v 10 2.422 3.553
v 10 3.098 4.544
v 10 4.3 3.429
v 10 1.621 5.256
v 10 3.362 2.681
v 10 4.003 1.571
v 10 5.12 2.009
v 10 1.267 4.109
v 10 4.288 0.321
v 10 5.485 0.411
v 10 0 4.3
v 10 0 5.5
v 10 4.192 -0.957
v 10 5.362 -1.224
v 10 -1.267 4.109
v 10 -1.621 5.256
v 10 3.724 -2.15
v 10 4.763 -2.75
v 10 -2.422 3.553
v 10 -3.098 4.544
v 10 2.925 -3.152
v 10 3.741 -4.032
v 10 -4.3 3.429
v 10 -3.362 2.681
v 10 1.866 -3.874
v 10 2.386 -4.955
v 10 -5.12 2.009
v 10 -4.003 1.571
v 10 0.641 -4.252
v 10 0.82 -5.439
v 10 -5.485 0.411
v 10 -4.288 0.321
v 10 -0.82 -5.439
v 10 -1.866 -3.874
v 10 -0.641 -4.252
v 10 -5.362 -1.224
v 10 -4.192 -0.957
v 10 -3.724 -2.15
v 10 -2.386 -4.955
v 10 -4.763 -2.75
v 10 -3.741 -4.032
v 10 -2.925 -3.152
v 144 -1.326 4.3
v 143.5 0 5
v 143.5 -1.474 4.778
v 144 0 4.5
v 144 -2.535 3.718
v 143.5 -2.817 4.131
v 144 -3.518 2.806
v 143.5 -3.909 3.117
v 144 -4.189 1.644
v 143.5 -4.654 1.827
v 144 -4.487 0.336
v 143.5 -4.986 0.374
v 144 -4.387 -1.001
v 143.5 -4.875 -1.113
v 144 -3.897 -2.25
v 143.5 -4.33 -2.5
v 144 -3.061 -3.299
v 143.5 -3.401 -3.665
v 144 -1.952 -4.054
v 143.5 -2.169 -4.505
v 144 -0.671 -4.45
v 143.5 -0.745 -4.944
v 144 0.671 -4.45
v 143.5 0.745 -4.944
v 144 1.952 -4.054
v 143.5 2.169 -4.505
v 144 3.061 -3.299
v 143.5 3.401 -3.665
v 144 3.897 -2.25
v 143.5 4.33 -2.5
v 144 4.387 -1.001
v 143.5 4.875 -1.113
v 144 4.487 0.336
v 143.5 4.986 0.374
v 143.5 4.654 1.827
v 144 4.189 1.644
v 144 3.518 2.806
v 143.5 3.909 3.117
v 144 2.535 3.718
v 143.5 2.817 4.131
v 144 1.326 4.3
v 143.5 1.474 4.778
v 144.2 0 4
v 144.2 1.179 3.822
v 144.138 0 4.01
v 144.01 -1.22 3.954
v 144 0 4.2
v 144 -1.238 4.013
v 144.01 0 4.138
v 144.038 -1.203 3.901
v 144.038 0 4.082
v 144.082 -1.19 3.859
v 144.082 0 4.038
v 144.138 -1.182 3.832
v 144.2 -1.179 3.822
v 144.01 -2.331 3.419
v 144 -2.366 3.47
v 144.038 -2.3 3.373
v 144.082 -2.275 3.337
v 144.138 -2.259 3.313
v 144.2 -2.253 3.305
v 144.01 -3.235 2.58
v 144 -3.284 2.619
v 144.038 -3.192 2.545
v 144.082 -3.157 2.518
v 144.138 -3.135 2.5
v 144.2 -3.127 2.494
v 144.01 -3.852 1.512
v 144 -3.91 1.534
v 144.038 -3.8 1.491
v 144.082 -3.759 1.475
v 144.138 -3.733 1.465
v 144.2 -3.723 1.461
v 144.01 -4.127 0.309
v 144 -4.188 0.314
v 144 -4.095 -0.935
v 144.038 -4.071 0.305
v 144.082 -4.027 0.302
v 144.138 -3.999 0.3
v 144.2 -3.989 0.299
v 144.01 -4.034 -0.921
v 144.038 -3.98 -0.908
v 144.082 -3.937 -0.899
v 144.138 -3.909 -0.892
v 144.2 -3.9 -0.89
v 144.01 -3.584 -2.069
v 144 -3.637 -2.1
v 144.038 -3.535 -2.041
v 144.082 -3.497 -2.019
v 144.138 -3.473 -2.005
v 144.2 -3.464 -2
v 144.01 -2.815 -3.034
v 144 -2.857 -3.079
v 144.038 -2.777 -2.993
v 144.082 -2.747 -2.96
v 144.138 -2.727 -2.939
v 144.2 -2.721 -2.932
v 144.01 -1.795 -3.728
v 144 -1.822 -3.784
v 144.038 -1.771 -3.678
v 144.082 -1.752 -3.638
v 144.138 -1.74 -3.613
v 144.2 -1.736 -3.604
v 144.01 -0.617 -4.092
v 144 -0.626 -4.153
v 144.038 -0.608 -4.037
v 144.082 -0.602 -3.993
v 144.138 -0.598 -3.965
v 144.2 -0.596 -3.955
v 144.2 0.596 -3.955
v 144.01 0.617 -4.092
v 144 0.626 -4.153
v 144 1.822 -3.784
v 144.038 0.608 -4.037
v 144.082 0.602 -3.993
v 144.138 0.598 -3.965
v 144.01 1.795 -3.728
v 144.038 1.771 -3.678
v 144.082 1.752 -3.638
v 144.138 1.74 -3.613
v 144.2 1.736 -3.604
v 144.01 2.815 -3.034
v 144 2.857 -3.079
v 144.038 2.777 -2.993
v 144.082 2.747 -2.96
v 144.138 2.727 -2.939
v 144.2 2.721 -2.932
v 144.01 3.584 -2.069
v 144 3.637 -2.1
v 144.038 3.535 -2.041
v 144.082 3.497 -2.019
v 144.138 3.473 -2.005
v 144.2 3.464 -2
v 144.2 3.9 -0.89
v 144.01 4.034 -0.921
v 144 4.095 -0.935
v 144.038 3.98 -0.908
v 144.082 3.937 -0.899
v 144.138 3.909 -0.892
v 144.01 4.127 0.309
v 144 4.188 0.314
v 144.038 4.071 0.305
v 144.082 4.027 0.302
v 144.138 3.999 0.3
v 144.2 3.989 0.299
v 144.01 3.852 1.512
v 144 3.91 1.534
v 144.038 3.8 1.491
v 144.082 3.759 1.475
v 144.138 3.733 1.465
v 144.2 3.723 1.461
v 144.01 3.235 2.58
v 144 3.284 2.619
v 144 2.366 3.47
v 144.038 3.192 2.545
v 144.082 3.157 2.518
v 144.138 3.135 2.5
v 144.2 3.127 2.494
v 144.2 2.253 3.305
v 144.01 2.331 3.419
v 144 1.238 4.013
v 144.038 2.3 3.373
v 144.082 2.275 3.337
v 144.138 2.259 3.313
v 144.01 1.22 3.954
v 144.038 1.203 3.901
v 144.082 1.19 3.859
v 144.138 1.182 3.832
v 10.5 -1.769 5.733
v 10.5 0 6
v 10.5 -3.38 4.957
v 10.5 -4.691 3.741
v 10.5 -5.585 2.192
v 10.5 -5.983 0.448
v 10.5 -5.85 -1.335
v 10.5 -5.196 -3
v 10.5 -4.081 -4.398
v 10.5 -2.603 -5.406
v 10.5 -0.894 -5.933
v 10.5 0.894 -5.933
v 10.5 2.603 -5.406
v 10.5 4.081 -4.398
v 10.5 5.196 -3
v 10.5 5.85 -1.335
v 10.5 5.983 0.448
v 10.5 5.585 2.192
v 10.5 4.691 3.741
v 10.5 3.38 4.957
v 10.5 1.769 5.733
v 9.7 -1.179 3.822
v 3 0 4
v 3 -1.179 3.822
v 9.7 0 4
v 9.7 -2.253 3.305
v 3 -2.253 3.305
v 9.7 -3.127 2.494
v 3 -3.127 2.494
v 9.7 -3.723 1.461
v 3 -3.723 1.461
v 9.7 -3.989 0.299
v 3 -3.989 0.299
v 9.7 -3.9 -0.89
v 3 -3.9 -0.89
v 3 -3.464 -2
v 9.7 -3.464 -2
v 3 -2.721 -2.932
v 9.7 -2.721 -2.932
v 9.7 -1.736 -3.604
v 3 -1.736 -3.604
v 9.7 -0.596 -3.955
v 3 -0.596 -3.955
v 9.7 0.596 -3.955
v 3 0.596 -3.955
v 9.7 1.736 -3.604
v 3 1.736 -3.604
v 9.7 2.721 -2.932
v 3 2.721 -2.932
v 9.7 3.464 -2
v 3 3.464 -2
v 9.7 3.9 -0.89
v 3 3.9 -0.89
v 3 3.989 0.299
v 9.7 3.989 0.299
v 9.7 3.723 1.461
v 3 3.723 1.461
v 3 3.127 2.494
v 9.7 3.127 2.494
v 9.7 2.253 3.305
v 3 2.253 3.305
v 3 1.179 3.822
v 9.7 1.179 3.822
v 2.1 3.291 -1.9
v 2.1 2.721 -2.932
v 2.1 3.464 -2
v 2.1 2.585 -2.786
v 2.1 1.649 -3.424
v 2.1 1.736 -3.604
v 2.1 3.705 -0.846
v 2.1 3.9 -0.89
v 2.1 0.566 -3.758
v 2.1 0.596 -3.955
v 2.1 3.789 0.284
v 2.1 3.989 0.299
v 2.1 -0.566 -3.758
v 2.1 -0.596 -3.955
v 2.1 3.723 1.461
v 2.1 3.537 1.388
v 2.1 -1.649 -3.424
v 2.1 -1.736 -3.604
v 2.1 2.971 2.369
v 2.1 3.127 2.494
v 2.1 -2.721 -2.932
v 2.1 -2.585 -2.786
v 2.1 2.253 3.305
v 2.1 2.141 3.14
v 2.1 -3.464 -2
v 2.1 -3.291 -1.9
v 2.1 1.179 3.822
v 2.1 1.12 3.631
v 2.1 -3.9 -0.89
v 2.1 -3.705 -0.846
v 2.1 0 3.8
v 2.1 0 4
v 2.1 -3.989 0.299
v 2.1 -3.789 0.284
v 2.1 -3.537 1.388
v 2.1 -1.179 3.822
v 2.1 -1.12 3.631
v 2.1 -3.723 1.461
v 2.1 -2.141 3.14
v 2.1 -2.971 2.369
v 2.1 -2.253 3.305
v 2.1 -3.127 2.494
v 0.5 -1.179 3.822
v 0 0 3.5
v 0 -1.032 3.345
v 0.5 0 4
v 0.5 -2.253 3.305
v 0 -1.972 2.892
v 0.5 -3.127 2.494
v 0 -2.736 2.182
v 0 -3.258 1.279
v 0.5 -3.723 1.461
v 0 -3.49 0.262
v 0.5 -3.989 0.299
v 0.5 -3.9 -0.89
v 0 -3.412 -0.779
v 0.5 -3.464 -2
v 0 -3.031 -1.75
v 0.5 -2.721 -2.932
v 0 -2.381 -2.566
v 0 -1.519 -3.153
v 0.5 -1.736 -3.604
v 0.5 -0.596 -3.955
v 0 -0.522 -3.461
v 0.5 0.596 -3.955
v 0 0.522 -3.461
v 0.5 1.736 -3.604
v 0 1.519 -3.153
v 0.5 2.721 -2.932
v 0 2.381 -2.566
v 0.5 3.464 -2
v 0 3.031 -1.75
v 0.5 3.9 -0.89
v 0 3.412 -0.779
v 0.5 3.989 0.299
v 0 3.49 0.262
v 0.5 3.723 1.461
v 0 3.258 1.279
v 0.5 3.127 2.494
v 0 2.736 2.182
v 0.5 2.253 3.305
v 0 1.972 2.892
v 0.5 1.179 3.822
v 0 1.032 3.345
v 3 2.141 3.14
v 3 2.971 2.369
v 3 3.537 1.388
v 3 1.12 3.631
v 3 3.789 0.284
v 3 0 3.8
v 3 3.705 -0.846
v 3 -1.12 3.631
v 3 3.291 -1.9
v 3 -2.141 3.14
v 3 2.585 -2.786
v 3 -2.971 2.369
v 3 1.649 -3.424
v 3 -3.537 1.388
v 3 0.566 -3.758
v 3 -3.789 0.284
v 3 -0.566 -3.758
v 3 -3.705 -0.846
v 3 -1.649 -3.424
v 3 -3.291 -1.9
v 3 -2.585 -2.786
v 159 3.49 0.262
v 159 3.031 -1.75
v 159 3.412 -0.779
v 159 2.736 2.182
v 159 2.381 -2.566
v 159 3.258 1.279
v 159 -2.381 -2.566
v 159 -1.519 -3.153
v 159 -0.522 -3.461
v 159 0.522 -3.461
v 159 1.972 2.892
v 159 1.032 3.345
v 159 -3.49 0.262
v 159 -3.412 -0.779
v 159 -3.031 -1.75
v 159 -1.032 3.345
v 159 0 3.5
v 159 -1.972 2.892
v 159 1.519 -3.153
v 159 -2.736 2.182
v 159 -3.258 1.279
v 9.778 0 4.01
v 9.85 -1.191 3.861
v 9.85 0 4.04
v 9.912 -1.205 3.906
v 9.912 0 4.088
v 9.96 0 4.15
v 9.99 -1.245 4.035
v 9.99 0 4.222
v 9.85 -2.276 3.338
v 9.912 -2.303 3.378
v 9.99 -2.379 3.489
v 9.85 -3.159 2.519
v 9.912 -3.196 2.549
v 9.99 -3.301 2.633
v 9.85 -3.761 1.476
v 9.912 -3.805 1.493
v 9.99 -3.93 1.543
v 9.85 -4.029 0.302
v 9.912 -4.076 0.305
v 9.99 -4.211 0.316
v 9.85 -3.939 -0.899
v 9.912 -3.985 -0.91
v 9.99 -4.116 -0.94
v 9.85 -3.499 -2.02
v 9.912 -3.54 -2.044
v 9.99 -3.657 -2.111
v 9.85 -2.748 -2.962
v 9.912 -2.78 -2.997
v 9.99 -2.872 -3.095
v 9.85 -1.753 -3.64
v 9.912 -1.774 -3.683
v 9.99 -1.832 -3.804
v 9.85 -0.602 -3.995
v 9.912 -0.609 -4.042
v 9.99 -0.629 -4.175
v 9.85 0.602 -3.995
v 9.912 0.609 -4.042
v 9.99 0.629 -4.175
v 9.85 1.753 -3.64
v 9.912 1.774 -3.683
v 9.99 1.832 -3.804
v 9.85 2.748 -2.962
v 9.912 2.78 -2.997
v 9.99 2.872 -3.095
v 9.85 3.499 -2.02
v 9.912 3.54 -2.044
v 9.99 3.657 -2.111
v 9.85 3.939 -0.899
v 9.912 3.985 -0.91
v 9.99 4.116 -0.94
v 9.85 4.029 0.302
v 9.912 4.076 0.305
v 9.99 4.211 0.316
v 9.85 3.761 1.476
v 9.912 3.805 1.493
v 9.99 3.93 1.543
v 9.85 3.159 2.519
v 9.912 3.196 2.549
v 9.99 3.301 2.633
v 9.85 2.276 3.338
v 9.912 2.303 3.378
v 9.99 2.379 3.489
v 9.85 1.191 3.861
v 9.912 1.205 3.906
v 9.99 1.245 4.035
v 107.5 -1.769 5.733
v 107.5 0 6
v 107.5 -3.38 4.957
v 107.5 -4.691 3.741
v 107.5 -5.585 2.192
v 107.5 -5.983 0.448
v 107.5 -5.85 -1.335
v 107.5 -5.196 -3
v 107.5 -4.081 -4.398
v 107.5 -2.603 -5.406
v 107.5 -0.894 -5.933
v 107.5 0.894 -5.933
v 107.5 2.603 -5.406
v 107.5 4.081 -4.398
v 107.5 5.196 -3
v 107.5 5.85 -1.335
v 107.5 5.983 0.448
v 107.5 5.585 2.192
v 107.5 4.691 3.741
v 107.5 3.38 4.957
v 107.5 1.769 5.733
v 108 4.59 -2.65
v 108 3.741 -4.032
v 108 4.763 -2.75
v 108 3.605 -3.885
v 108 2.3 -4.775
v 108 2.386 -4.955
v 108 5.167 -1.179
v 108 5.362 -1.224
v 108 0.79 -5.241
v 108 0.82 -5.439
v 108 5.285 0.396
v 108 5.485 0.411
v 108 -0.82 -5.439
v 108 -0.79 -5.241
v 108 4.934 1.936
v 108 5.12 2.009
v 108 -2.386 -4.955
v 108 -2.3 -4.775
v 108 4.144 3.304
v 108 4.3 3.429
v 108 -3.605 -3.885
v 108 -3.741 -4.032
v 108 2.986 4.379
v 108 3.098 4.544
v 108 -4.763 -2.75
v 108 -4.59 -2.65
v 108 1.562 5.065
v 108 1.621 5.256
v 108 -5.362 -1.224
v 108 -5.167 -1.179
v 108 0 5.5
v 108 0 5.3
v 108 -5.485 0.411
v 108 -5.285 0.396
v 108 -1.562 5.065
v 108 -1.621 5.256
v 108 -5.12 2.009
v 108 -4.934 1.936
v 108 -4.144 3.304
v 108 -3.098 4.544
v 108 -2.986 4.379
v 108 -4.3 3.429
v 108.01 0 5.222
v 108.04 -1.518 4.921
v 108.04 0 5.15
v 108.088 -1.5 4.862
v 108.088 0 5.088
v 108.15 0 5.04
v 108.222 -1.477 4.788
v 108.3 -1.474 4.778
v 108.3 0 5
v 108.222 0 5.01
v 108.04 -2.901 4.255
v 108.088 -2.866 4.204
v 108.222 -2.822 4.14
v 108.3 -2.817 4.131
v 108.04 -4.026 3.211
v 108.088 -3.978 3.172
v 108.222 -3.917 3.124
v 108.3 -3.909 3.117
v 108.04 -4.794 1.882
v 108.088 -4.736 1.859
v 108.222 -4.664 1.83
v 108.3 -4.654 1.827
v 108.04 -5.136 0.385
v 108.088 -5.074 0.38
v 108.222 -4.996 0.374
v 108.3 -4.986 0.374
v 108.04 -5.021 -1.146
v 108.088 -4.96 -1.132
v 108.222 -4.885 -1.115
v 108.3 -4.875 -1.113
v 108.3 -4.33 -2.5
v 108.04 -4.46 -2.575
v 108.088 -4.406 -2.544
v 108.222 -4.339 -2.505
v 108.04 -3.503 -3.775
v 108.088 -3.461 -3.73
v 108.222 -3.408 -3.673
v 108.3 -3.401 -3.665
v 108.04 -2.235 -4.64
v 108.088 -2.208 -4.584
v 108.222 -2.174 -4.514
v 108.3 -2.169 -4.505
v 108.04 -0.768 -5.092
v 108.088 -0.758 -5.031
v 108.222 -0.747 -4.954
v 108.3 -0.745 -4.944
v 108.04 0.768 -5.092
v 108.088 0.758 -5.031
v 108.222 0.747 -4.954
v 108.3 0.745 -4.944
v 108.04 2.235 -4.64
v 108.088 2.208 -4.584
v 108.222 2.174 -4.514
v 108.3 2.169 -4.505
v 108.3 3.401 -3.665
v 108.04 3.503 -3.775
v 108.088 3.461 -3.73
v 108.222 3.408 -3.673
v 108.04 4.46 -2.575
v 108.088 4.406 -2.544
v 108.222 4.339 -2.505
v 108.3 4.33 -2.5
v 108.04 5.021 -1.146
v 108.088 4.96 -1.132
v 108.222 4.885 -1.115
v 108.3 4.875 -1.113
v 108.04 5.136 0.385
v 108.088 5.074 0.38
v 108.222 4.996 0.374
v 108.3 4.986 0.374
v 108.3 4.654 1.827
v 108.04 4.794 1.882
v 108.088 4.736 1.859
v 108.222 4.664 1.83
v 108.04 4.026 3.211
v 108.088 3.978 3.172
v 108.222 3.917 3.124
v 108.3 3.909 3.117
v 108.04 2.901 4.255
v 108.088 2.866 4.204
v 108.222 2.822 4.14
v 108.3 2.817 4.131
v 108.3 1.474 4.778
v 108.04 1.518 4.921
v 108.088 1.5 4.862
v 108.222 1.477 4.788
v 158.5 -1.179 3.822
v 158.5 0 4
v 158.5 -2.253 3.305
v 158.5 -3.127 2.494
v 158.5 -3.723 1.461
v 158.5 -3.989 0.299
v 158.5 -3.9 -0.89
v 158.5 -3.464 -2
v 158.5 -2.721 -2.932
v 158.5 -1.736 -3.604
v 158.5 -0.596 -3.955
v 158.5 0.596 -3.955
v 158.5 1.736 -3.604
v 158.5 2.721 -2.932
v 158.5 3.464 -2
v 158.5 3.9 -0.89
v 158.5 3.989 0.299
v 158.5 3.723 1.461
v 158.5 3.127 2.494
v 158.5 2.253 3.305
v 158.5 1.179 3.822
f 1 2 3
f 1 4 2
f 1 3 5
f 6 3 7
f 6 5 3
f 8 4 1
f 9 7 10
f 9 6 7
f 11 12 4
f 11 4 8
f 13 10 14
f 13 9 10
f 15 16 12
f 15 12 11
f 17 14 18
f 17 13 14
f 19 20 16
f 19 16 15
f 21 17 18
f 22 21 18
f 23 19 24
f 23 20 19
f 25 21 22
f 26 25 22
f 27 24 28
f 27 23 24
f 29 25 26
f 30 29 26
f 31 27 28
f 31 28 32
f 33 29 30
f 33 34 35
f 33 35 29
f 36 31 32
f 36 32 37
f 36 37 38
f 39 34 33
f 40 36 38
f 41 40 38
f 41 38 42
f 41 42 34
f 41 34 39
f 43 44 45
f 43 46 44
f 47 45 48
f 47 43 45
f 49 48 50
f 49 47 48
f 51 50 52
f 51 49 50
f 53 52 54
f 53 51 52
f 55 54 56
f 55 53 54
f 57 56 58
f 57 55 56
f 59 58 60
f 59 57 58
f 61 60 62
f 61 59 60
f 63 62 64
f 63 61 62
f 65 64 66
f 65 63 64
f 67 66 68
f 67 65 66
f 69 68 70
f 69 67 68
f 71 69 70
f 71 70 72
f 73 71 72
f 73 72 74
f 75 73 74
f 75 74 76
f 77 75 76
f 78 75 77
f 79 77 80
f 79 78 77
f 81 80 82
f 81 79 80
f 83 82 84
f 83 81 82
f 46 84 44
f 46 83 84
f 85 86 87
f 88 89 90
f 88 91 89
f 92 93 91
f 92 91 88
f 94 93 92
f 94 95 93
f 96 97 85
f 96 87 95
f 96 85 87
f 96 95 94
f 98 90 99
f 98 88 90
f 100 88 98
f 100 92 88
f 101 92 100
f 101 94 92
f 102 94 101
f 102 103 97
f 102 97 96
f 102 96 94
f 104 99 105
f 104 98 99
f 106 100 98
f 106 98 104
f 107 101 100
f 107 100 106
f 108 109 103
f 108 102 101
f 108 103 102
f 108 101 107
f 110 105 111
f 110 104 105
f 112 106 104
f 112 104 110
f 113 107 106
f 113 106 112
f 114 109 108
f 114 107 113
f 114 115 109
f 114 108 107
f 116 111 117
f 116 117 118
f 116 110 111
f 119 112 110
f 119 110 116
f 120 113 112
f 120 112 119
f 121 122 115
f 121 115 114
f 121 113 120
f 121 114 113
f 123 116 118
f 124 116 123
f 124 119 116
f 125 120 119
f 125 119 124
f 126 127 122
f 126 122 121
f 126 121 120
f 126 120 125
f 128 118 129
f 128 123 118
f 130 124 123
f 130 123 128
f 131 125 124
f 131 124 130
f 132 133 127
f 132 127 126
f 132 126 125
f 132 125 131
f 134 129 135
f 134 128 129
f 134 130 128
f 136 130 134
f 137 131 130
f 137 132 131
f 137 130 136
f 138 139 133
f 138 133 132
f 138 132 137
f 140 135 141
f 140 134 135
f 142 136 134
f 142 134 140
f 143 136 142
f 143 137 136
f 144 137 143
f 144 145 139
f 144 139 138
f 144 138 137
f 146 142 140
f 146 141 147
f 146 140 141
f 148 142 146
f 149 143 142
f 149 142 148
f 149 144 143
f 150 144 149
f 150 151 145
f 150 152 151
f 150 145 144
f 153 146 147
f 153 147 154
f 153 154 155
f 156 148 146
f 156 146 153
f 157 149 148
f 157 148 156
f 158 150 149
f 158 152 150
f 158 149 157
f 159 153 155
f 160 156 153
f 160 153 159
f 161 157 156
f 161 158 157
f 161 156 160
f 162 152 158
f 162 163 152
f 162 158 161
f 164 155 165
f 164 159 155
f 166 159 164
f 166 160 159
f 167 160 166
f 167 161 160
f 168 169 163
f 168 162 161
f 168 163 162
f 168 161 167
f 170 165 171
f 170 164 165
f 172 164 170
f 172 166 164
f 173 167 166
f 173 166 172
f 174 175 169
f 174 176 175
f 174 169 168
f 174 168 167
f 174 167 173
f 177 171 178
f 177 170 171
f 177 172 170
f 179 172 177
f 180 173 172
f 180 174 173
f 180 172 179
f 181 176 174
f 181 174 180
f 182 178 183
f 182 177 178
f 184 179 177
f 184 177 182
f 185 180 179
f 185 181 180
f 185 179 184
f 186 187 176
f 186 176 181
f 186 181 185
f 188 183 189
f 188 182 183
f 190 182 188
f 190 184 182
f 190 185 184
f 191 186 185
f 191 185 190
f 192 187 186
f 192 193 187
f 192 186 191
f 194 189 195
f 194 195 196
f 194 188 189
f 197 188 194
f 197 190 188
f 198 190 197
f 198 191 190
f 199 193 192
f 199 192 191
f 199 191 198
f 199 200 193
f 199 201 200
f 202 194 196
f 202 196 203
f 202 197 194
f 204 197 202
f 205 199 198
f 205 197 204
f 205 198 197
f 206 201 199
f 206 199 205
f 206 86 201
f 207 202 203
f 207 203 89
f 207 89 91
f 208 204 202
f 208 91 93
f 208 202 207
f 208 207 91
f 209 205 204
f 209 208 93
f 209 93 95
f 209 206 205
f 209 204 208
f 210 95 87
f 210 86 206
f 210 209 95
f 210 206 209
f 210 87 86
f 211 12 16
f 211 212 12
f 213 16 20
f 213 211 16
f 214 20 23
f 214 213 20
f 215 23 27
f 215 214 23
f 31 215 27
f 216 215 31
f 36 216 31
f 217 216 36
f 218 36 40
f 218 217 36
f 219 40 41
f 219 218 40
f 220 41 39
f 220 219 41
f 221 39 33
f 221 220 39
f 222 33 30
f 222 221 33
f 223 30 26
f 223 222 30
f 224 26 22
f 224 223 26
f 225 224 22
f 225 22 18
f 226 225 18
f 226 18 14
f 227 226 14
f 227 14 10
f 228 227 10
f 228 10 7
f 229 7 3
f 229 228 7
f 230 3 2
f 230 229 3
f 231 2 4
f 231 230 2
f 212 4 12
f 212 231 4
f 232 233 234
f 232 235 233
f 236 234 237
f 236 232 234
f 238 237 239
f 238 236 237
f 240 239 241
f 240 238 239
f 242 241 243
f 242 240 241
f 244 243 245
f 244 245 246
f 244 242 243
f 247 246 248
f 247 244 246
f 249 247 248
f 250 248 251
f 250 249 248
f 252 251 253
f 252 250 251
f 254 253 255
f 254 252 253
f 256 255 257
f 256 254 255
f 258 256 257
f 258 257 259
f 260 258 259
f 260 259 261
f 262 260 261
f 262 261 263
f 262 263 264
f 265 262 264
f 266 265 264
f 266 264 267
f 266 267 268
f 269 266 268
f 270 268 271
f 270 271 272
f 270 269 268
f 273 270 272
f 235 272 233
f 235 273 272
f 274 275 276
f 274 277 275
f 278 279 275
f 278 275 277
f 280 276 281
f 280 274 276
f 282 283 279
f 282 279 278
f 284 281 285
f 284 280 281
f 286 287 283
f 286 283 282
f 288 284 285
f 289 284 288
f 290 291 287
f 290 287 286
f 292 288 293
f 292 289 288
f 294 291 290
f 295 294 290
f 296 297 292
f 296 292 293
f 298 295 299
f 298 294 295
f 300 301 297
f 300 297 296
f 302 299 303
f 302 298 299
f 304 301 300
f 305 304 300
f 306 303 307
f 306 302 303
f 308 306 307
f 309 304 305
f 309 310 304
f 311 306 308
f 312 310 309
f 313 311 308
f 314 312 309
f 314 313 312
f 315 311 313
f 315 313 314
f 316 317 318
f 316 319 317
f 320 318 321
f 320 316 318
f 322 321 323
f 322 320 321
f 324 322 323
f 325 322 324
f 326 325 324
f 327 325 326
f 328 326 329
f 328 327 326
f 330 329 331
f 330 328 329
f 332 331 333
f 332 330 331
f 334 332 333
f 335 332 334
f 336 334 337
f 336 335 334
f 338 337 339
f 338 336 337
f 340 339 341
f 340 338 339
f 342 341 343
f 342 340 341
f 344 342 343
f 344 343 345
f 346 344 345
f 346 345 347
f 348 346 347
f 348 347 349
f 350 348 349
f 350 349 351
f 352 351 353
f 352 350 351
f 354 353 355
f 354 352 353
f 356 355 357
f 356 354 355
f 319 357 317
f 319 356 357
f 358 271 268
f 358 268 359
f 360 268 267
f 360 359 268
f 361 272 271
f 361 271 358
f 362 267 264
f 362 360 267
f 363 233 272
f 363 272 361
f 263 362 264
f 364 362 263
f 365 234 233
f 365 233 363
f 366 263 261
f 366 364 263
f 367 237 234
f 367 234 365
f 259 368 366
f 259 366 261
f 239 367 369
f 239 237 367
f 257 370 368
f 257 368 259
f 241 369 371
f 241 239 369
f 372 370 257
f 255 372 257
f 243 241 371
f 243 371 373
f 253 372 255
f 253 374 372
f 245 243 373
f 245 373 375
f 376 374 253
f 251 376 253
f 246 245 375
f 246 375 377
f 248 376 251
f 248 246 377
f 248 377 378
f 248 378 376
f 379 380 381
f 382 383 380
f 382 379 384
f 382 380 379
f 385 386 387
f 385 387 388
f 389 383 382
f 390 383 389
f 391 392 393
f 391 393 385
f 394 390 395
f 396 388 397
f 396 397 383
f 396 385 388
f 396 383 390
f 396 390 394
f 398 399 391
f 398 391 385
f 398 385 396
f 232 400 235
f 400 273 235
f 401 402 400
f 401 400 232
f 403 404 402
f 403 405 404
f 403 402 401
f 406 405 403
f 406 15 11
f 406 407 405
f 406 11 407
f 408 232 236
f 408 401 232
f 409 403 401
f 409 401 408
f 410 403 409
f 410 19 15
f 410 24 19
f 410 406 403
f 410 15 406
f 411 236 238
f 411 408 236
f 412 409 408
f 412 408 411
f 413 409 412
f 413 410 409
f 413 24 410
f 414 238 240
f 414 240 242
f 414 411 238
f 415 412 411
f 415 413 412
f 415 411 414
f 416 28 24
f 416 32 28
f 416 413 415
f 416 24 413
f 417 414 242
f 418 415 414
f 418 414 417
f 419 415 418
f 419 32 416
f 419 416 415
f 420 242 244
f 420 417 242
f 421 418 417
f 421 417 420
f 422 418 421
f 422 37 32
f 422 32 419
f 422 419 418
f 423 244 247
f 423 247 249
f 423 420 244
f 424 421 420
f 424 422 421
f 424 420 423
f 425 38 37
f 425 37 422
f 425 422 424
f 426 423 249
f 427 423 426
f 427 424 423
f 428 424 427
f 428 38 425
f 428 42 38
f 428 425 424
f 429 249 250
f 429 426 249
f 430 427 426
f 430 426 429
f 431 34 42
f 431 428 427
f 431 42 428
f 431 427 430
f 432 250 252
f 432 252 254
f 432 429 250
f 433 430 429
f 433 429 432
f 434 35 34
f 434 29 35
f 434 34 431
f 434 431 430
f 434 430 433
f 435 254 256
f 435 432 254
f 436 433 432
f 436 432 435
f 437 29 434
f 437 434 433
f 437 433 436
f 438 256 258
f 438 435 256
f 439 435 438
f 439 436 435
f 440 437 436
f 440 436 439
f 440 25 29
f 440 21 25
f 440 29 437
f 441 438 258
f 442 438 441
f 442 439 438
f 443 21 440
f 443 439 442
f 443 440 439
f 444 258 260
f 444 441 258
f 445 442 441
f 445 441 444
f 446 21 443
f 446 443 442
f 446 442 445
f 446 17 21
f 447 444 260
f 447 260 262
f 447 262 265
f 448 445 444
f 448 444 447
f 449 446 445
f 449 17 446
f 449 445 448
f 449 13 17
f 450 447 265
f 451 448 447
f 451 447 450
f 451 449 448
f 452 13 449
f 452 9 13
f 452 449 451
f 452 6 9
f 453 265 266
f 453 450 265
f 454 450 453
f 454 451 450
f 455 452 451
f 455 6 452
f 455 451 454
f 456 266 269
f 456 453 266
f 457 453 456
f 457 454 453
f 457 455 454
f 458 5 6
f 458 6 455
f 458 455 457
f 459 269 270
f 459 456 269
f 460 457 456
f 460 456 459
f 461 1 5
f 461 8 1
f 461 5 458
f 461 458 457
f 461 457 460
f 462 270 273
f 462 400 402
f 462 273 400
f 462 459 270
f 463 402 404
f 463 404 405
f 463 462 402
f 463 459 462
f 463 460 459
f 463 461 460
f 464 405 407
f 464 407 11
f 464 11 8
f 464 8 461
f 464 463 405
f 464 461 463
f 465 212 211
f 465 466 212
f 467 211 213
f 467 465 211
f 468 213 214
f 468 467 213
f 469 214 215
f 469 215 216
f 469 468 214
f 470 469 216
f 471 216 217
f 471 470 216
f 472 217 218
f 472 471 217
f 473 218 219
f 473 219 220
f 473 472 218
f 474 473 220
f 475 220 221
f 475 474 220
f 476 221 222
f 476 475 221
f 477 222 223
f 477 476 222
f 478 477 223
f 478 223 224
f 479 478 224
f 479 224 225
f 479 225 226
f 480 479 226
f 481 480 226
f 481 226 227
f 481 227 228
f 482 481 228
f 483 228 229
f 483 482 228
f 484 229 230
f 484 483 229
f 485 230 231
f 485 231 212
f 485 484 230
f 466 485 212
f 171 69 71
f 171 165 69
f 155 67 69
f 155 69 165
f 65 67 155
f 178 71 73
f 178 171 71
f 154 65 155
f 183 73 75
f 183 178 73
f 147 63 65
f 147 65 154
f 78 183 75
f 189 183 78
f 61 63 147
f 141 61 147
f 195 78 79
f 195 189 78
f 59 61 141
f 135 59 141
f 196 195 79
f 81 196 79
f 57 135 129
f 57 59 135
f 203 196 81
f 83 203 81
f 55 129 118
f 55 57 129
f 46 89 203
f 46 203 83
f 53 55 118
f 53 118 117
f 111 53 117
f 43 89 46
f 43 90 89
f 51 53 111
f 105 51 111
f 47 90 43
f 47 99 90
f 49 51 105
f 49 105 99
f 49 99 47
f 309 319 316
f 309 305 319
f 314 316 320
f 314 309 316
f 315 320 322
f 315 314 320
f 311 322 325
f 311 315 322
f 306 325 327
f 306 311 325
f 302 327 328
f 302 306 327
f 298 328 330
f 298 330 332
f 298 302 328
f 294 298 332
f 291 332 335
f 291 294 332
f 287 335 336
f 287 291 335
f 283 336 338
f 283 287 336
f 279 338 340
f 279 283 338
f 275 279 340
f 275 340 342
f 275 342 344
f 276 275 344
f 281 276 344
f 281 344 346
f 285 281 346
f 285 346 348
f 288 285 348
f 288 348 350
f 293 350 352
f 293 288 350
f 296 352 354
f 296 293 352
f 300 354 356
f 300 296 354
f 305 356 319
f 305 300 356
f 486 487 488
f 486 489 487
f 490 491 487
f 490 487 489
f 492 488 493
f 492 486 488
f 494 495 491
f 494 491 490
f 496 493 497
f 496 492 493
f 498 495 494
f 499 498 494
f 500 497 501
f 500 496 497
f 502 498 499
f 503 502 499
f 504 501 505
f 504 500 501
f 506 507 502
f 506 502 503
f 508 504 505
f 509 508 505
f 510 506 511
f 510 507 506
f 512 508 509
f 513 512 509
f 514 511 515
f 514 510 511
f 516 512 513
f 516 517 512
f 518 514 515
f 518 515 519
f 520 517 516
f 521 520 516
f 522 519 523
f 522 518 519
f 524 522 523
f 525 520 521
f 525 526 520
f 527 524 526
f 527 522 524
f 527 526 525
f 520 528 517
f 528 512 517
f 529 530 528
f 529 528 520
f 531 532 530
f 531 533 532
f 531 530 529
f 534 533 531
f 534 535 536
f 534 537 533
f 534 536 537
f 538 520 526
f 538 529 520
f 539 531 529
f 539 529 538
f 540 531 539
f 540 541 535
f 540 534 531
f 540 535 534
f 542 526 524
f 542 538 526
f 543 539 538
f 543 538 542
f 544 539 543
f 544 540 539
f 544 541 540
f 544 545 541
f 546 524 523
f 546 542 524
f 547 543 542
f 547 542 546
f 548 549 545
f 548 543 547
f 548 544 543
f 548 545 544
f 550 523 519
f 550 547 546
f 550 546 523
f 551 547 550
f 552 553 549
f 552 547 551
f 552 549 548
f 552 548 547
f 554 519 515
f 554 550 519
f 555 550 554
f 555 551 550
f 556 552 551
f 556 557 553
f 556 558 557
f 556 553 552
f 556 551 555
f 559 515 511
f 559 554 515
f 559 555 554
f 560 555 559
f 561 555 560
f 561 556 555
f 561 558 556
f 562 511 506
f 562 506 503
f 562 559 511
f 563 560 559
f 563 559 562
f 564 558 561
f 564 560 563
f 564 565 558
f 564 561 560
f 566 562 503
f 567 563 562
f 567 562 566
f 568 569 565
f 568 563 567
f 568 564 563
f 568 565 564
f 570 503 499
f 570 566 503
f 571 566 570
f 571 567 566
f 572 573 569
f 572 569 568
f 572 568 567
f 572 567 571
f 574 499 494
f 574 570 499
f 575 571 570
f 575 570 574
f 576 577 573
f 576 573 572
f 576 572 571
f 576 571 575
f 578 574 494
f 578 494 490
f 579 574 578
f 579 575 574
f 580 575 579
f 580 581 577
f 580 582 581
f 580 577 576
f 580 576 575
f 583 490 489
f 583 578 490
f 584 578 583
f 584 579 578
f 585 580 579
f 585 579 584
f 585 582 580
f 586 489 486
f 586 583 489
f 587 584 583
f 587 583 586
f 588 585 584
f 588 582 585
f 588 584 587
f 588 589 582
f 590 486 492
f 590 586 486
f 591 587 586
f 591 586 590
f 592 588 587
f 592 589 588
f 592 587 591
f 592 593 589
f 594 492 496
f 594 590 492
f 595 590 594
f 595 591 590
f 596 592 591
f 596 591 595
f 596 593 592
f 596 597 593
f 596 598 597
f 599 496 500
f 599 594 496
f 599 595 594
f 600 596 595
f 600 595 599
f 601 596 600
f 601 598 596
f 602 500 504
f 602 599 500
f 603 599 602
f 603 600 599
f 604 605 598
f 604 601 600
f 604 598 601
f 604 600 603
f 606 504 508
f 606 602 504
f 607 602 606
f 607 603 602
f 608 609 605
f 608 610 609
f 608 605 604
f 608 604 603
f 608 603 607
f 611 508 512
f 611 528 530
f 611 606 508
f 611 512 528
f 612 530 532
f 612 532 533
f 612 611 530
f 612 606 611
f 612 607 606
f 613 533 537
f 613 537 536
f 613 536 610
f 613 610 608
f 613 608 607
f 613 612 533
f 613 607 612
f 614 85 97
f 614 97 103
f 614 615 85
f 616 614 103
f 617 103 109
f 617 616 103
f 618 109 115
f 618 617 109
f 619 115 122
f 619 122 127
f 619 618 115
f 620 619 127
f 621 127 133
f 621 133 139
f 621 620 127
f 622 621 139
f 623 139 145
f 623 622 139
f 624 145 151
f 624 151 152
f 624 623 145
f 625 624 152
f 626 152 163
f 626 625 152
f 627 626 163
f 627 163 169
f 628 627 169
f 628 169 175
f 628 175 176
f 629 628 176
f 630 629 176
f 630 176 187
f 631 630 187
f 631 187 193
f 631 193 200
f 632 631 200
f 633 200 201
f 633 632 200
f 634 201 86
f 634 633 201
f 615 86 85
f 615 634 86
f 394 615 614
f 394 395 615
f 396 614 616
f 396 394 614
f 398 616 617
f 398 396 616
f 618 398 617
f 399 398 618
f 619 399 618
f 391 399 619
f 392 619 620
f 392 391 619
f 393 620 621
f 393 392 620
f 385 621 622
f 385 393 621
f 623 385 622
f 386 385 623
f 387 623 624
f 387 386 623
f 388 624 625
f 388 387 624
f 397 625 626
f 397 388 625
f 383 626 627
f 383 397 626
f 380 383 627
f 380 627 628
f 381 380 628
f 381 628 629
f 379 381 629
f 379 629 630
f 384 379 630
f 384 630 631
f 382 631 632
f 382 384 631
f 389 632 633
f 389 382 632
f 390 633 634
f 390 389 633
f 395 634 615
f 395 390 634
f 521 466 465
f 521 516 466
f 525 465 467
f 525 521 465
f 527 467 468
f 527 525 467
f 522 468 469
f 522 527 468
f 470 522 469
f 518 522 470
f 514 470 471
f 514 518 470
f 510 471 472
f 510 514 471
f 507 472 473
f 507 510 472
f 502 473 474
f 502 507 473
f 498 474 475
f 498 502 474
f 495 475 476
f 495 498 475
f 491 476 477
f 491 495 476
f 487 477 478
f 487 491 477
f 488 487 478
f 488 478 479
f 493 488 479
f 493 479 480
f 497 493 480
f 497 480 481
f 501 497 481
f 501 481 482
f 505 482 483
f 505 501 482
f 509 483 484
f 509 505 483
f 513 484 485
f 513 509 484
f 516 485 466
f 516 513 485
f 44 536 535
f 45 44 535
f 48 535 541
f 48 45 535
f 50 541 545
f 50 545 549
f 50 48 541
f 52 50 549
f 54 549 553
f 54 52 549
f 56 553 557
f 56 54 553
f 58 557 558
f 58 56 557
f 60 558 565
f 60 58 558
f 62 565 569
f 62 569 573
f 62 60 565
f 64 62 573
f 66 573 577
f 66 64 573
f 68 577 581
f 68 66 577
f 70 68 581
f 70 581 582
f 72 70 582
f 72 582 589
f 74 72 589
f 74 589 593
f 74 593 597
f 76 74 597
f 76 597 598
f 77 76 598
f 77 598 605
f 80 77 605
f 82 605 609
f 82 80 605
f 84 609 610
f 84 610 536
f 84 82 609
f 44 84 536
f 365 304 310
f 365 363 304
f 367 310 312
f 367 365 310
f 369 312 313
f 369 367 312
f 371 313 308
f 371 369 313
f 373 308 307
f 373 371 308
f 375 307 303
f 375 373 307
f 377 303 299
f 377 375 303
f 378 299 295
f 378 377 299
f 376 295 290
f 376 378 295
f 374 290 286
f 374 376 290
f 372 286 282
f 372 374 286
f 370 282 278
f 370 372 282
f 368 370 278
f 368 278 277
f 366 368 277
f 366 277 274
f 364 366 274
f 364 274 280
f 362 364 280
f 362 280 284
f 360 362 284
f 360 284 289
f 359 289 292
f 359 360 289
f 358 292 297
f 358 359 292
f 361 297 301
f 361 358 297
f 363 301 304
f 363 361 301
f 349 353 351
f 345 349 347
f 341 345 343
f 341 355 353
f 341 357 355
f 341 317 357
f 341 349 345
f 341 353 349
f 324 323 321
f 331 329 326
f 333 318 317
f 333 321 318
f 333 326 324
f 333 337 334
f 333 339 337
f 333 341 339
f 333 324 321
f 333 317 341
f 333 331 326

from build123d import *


with BuildPart() as part:
    # Sketch1 → Revolve1 (revolve)
    with BuildSketch(Plane.XY):
        with BuildLine():
            Line((2.1, 4), (2.1, 3.8))
            Line((2.1, 3.8), (3, 3.8))
            Line((3, 3.8), (3, 4))
            Line((3, 4), (9.7, 4))
            ThreePointArc((9.7, 4), (9.912132034, 4.087867966), (10, 4.3))
            Line((10, 4.3), (10, 5.5))
            Line((10, 5.5), (10.5, 6))
            Line((10.5, 6), (107.5, 6))
            Line((107.5, 6), (108, 5.5))
            Line((108, 5.5), (108, 5.3))
            ThreePointArc((108, 5.3), (108.087867966, 5.087867966), (108.3, 5))
            Line((108.3, 5), (143.5, 5))
            Line((143.5, 5), (144, 4.5))
            Line((144, 4.5), (144, 4.2))
            ThreePointArc((144, 4.2), (144.058578644, 4.058578644), (144.2, 4))
            Line((144.2, 4), (158.5, 4))
            Line((158.5, 4), (159, 3.5))
            Line((159, 3.5), (159, 0))
            Line((159, 0), (0, 0))
            Line((0, 0), (0, 3.5))
            Line((0, 3.5), (0.5, 4))
            Line((0.5, 4), (2.1, 4))
        make_face()
    revolve(axis=Axis((-7.5, 0, 0), (1, 0, 0)))


solid = part.part
